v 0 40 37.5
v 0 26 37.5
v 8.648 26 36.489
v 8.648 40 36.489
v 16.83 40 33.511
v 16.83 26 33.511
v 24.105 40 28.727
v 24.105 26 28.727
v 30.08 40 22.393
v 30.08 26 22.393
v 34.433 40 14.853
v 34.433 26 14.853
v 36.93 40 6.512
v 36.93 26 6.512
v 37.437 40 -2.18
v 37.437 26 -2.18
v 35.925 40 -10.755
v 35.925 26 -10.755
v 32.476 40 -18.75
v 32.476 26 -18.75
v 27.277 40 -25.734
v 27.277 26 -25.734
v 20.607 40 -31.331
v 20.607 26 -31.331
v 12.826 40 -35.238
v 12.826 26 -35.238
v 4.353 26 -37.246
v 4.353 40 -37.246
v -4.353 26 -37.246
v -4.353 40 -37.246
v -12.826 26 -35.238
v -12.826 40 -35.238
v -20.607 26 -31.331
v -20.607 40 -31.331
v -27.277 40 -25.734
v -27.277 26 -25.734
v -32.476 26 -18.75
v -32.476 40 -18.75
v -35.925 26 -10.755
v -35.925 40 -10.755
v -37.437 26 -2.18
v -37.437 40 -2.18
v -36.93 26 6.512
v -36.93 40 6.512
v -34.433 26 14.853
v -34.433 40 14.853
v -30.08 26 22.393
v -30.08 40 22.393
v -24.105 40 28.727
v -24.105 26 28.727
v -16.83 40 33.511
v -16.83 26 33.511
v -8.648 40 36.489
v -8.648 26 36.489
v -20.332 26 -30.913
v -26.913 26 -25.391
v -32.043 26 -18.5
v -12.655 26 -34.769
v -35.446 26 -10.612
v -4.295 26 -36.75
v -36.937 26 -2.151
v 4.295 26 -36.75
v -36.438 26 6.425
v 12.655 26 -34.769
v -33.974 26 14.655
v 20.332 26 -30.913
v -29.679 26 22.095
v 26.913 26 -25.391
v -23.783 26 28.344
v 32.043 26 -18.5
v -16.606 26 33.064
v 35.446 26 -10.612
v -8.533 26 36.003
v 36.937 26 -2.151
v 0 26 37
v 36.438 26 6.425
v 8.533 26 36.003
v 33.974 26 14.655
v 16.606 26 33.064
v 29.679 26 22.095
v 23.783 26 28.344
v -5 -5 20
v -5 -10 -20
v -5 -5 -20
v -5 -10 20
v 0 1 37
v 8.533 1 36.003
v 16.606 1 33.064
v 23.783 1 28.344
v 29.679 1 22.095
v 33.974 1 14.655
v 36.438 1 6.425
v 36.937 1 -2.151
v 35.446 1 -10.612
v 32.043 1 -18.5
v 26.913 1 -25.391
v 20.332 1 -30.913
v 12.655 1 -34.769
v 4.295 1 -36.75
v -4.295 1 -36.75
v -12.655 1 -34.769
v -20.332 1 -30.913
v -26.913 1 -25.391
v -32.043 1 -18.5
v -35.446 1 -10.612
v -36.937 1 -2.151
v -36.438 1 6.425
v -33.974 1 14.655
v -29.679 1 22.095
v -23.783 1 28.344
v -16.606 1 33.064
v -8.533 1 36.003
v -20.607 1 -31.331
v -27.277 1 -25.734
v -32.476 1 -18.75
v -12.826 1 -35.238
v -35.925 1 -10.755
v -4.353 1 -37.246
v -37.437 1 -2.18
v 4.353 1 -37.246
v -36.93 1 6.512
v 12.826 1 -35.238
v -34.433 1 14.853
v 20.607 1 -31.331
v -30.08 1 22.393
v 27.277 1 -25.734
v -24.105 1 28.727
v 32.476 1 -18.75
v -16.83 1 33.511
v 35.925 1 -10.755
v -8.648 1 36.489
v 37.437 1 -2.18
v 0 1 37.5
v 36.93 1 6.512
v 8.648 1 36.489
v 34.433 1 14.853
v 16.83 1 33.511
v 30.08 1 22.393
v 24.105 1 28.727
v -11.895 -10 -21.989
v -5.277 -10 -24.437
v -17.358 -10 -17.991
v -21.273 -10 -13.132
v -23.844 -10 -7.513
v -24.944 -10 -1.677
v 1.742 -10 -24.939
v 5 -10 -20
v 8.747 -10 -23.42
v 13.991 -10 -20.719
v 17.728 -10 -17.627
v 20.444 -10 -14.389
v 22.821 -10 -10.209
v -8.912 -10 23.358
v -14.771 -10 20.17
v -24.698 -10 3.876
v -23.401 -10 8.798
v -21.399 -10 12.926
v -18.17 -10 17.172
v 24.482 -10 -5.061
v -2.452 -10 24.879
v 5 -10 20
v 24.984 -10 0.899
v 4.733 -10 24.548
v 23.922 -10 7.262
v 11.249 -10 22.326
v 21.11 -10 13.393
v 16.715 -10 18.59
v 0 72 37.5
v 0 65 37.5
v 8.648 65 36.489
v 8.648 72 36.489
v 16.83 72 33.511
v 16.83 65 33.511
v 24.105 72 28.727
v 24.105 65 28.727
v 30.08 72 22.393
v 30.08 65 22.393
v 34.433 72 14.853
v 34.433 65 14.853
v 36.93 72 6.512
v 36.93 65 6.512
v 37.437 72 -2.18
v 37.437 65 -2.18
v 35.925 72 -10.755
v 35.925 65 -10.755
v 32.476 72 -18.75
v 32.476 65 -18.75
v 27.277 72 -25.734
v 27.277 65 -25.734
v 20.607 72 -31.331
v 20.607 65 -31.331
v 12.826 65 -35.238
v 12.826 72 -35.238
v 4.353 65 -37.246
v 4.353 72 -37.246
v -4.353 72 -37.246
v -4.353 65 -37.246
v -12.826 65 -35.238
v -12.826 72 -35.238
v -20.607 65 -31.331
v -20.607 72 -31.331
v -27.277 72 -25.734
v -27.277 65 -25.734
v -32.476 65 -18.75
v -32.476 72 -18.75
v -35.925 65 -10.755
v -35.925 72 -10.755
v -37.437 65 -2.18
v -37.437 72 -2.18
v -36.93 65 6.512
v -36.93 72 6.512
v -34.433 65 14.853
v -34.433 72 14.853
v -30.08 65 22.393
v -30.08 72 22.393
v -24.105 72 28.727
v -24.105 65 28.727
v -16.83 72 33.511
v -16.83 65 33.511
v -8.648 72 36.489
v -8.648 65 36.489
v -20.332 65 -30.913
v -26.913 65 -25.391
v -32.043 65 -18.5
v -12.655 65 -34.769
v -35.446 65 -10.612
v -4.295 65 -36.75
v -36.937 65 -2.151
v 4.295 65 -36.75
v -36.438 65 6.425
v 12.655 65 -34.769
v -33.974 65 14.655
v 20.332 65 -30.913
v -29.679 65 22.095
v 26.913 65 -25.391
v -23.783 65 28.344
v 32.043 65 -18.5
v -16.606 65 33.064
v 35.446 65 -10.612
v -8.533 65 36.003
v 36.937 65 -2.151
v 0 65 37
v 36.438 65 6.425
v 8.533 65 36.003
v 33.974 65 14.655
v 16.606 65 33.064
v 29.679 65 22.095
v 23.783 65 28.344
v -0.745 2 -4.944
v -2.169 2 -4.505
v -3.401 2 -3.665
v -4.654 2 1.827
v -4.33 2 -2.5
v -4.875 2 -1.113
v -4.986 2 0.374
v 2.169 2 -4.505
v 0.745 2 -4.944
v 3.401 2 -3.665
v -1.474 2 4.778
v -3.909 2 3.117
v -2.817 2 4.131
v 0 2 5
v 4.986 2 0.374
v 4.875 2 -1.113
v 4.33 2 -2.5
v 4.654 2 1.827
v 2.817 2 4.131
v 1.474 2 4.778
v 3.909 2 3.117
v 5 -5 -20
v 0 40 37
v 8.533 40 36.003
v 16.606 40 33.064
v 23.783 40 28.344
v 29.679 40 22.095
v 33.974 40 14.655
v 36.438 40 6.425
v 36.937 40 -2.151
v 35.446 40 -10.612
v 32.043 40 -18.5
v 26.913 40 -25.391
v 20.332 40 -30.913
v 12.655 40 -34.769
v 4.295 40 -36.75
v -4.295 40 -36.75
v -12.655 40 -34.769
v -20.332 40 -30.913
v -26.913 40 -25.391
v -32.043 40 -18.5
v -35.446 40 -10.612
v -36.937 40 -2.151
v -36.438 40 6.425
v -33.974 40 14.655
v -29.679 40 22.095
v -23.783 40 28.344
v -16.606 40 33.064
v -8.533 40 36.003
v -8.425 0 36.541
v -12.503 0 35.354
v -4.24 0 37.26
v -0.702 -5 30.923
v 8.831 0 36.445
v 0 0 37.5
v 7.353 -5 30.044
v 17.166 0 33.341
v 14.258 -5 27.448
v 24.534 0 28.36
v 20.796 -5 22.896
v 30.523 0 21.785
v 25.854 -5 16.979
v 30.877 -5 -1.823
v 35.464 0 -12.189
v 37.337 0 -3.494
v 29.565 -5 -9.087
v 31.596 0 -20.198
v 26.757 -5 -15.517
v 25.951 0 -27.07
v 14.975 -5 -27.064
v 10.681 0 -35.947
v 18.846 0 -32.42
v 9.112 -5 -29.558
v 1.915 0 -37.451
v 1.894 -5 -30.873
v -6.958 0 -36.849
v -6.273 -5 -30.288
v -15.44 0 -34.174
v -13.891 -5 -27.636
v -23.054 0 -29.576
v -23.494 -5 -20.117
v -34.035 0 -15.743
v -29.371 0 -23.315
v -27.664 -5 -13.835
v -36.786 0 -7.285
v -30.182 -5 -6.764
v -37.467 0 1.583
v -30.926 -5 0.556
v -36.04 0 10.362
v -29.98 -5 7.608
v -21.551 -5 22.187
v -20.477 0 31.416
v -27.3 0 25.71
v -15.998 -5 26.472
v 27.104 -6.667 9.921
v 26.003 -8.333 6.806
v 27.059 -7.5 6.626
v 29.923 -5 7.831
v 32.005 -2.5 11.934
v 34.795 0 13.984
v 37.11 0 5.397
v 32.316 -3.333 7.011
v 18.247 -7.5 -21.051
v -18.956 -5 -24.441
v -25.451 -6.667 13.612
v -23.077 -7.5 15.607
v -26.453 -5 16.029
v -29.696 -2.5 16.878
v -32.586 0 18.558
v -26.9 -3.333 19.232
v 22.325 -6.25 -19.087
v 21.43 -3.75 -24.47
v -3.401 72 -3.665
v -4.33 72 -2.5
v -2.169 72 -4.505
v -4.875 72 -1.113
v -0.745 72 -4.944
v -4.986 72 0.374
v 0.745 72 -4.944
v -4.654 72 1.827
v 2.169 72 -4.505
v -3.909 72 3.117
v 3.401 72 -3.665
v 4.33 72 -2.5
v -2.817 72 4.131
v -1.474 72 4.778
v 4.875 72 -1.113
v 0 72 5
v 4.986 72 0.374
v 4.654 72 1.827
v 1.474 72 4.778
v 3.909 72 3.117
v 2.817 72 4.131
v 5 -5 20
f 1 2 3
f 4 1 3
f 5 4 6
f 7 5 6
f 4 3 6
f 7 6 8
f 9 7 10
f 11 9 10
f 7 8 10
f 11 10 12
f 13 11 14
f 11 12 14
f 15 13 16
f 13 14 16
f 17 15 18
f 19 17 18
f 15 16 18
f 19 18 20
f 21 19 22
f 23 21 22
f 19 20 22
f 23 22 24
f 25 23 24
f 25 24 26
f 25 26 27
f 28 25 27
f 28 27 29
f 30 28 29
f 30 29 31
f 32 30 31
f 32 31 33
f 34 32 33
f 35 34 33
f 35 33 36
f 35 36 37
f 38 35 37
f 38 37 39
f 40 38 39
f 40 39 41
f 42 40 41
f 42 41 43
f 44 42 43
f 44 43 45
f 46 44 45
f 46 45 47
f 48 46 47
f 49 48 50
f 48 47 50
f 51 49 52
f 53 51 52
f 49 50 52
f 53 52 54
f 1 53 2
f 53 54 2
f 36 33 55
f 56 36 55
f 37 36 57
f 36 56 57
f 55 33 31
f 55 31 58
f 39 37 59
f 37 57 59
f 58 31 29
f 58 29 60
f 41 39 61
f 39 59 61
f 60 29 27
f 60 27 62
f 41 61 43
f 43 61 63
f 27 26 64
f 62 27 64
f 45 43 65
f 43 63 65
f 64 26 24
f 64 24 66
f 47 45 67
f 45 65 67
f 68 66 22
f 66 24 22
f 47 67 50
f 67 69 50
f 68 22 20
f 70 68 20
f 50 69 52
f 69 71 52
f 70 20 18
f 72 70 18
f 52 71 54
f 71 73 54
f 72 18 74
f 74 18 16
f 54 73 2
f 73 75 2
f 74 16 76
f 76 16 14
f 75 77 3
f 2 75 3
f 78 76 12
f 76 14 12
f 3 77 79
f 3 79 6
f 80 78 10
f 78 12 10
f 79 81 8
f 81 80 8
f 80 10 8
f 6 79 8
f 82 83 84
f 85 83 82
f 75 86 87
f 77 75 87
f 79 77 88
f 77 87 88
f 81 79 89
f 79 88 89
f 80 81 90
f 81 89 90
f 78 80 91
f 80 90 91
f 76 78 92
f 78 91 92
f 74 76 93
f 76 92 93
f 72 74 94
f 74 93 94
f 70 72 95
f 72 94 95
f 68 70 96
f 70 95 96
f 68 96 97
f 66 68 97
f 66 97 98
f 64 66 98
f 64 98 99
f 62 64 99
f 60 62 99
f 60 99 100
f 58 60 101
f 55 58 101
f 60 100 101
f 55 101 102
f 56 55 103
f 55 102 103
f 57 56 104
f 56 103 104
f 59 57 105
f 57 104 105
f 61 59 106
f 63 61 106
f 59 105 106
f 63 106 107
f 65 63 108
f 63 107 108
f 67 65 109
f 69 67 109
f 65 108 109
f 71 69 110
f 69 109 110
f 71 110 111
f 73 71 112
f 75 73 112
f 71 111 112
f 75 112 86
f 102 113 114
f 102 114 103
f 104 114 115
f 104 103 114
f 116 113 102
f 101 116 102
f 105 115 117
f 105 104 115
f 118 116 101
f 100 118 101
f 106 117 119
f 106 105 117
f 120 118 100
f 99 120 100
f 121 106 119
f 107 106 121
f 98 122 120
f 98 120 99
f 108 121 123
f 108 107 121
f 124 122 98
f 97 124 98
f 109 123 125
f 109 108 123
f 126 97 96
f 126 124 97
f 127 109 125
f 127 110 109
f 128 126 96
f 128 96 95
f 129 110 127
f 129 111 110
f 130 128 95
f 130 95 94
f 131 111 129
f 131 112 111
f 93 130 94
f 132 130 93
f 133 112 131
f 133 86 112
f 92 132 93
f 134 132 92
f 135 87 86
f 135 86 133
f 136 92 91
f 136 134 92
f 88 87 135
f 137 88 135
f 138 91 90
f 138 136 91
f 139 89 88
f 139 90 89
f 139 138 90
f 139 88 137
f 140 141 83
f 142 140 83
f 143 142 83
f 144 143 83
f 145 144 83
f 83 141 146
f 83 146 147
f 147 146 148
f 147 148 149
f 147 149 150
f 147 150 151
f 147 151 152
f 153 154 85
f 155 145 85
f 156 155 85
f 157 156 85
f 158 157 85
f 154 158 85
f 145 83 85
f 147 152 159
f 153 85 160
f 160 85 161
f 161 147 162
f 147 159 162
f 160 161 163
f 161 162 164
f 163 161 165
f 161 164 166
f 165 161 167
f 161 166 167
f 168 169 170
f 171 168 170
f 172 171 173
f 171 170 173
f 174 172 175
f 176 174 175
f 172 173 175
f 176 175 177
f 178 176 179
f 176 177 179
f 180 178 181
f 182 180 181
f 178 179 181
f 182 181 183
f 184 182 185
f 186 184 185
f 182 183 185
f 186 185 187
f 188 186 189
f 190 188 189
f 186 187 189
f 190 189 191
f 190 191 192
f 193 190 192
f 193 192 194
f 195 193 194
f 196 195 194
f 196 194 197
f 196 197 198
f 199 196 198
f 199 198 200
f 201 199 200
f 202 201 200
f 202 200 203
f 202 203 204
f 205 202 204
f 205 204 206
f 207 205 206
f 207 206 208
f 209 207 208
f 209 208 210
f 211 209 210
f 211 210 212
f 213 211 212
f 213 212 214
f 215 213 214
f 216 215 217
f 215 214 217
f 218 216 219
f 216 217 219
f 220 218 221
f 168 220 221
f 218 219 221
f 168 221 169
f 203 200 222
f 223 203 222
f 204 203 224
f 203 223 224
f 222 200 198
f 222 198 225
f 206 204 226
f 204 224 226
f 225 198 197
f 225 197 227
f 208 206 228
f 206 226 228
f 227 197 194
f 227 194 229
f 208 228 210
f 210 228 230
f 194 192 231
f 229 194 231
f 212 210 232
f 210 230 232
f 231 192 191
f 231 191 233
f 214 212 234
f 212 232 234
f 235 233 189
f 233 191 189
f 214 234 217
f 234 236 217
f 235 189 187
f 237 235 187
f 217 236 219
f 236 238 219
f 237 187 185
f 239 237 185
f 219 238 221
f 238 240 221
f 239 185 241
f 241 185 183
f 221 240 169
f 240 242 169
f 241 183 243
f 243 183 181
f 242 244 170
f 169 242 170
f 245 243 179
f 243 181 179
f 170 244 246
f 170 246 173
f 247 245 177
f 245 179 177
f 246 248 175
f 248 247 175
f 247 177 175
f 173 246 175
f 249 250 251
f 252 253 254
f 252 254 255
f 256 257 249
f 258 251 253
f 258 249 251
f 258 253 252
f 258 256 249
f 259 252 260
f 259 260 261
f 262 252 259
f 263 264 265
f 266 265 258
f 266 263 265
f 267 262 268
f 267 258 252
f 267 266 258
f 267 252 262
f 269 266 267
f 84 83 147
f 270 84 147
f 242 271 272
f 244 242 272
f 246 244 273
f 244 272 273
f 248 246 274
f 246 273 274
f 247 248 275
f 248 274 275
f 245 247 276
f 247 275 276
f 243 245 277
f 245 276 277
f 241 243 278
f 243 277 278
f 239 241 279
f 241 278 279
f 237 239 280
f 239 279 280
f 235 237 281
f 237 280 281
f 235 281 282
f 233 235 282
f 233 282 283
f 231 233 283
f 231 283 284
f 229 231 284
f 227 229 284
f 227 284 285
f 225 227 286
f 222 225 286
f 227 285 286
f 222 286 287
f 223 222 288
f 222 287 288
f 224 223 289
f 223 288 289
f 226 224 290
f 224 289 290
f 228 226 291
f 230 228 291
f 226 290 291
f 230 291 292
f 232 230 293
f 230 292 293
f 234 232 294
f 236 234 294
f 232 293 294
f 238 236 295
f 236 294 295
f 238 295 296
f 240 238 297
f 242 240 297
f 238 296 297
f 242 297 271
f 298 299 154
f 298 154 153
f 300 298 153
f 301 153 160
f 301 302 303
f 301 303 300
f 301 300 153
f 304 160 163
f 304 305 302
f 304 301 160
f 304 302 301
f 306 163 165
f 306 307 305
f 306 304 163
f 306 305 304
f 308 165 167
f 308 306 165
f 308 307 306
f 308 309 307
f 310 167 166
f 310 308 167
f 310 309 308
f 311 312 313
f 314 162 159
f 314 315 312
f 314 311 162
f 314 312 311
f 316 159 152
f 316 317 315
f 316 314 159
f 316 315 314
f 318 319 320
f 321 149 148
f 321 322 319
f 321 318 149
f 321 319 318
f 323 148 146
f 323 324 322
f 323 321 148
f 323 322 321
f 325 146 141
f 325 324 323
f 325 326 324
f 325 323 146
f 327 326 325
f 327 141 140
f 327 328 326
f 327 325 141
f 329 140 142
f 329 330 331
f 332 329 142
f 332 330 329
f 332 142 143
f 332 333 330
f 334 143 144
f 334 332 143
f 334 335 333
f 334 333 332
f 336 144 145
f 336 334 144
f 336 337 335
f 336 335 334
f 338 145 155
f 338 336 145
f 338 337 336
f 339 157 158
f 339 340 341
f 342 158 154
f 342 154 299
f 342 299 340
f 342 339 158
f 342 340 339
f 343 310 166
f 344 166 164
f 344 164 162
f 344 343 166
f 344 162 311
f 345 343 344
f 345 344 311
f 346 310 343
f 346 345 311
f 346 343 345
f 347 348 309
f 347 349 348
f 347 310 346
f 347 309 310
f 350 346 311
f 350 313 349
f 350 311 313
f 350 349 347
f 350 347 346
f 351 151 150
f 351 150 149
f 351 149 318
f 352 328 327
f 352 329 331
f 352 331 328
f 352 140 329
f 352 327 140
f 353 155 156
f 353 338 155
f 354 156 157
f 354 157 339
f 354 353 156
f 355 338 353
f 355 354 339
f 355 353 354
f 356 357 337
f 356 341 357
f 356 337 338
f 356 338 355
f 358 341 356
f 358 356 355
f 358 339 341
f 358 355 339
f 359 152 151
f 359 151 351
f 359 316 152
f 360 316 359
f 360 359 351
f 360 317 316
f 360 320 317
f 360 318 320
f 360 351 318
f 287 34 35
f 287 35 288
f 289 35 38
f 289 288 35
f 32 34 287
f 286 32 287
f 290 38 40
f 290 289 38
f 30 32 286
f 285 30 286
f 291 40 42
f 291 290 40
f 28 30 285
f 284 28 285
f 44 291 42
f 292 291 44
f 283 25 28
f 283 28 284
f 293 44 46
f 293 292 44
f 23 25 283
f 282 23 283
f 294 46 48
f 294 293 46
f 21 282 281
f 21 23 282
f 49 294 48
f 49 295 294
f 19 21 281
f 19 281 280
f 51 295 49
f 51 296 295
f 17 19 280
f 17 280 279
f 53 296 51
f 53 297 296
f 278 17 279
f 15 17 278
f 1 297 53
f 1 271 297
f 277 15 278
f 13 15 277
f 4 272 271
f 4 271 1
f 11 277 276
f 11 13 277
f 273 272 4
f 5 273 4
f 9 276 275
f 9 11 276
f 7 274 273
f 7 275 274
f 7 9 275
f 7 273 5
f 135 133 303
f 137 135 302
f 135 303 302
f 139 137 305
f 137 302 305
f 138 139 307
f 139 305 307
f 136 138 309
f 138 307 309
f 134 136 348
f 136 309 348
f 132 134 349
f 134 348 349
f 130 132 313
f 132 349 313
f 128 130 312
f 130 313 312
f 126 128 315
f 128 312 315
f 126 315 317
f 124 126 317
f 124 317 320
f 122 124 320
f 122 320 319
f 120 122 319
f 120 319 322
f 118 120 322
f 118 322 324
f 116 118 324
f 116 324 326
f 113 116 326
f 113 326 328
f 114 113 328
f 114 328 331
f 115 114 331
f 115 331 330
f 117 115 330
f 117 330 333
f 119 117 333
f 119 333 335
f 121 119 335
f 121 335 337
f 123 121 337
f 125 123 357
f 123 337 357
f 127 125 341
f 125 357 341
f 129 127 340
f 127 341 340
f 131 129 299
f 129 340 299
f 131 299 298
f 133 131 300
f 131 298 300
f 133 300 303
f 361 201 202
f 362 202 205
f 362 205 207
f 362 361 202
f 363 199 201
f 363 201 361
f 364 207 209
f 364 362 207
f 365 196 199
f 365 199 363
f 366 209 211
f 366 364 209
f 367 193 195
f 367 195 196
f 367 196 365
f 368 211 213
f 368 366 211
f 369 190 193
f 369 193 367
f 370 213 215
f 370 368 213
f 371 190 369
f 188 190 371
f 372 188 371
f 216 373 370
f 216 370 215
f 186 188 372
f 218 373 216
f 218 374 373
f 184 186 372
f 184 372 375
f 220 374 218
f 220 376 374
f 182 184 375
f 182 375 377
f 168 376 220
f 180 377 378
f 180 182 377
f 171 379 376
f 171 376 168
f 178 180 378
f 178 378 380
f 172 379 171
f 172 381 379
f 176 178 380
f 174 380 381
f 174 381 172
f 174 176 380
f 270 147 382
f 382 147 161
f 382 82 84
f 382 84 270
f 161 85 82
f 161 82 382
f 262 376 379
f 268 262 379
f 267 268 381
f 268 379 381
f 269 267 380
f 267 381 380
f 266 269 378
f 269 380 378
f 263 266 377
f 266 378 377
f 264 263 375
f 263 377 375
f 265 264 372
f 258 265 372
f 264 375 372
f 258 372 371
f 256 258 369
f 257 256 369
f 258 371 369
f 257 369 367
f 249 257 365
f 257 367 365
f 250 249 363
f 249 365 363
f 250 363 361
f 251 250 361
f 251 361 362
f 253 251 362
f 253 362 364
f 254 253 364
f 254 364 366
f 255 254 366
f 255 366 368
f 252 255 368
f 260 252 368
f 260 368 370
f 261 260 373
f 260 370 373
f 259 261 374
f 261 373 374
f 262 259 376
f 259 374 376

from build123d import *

# Parameters (mm, degrees)
SKETCH1_R           = 37.5
BOSS_EXTRUDE1_DEPTH = 72
CUT_EXTRUDE1_START  = -25
SKETCH3_R           = 37.5
SKETCH3_R_2         = 37
CUT_EXTRUDE1_DEPTH  = 25
CUT_EXTRUDE2_START  = -25
SKETCH2_R           = 37.5
SKETCH2_R_2         = 37
CUT_EXTRUDE2_DEPTH  = 25
SKETCH5_R           = 5
CUT_EXTRUDE3_DEPTH  = 70
SKETCH6_W           = 10
SKETCH6_H           = 40
CUT_EXTRUDE4_DEPTH  = 5


with BuildPart() as part:
    # Sketch1 → Boss-Extrude1 (new body)
    with BuildSketch(Plane(origin=(0, 0, 0), x_dir=(1, 0, 0), z_dir=(0, 1, 0))):
        with Locations(Location((0, 0, 0), (0, 0, 270))):
            Circle(SKETCH1_R)
    extrude(amount=BOSS_EXTRUDE1_DEPTH)

    # Sketch3 → Cut-Extrude1 (cut)
    with BuildSketch(Plane(origin=(0, 65, 0), x_dir=(1, 0, 0), z_dir=(0, 1, 0)).offset(CUT_EXTRUDE1_START)):
        with Locations(Location((0, 0, 0), (0, 0, 270))):
            Circle(SKETCH3_R)
        with Locations(Location((0, 0, 0), (0, 0, 270))):
            Circle(SKETCH3_R_2, mode=Mode.SUBTRACT)
    extrude(amount=CUT_EXTRUDE1_DEPTH, mode=Mode.SUBTRACT)

    # Sketch2 → Cut-Extrude2 (cut)
    with BuildSketch(Plane(origin=(0, 26, 0), x_dir=(1, 0, 0), z_dir=(0, 1, 0)).offset(CUT_EXTRUDE2_START)):
        with Locations(Location((0, 0, 0), (0, 0, 270))):
            Circle(SKETCH2_R)
        with Locations(Location((0, 0, 0), (0, 0, 270))):
            Circle(SKETCH2_R_2, mode=Mode.SUBTRACT)
    extrude(amount=CUT_EXTRUDE2_DEPTH, mode=Mode.SUBTRACT)

    # Loft2: read off the stored shape, not the designer's step
    # Loft2: loft between two sections, ruled curve by curve
    loft2_from = [
        Edge.make_bspline([(-14.77077476, -10, 20.169883812), (25.568992863, -10, 49.711433333), (55.110542384, -10, 9.371665709), (14.77077476, -10, -20.169883812), (-25.568992863, -10, -49.711433333), (-55.110542384, -10, -9.371665709), (-14.77077476, -10, 20.169883812)], [0, 0, 0, 0, 0.5, 0.5, 0.5, 1, 1, 1, 1], 3, [1, 0.333333333, 0.333333333, 1, 0.333333333, 0.333333333, 1]),
    ]
    loft2_to = [
        Edge.make_bspline([(-12.502949146, 0, 35.354296241), (58.205643335, 0, 60.360194532), (83.211541627, 0, -10.348397949), (12.502949146, 0, -35.354296241), (-58.205643335, 0, -60.360194532), (-83.211541627, 0, 10.348397949), (-12.502949146, 0, 35.354296241)], [0, 0, 0, 0, 0.5, 0.5, 0.5, 1, 1, 1, 1], 3, [1, 0.333333333, 0.333333333, 1, 0.333333333, 0.333333333, 1]),
    ]
    loft2 = Solid(Shell([*[Face.make_surface_from_curves(loft2_from[k], loft2_to[k]) for k in range(1)], Face(Wire(loft2_from)), Face(Wire(loft2_to))]))
    add(loft2)

    # Sketch5 → Cut-Extrude3 (cut)
    with BuildSketch(Plane(origin=(0, 72, 0), x_dir=(1, 0, 0), z_dir=(0, 1, 0))):
        with Locations(Location((0, 0, 0), (0, 0, 270))):
            Circle(SKETCH5_R)
    extrude(amount=-CUT_EXTRUDE3_DEPTH, mode=Mode.SUBTRACT)

    # Sketch6 → Cut-Extrude4 (cut)
    with BuildSketch(Plane.XZ.offset(10)):
        Rectangle(SKETCH6_W, SKETCH6_H)
    extrude(amount=-CUT_EXTRUDE4_DEPTH, mode=Mode.SUBTRACT)


solid = part.part
